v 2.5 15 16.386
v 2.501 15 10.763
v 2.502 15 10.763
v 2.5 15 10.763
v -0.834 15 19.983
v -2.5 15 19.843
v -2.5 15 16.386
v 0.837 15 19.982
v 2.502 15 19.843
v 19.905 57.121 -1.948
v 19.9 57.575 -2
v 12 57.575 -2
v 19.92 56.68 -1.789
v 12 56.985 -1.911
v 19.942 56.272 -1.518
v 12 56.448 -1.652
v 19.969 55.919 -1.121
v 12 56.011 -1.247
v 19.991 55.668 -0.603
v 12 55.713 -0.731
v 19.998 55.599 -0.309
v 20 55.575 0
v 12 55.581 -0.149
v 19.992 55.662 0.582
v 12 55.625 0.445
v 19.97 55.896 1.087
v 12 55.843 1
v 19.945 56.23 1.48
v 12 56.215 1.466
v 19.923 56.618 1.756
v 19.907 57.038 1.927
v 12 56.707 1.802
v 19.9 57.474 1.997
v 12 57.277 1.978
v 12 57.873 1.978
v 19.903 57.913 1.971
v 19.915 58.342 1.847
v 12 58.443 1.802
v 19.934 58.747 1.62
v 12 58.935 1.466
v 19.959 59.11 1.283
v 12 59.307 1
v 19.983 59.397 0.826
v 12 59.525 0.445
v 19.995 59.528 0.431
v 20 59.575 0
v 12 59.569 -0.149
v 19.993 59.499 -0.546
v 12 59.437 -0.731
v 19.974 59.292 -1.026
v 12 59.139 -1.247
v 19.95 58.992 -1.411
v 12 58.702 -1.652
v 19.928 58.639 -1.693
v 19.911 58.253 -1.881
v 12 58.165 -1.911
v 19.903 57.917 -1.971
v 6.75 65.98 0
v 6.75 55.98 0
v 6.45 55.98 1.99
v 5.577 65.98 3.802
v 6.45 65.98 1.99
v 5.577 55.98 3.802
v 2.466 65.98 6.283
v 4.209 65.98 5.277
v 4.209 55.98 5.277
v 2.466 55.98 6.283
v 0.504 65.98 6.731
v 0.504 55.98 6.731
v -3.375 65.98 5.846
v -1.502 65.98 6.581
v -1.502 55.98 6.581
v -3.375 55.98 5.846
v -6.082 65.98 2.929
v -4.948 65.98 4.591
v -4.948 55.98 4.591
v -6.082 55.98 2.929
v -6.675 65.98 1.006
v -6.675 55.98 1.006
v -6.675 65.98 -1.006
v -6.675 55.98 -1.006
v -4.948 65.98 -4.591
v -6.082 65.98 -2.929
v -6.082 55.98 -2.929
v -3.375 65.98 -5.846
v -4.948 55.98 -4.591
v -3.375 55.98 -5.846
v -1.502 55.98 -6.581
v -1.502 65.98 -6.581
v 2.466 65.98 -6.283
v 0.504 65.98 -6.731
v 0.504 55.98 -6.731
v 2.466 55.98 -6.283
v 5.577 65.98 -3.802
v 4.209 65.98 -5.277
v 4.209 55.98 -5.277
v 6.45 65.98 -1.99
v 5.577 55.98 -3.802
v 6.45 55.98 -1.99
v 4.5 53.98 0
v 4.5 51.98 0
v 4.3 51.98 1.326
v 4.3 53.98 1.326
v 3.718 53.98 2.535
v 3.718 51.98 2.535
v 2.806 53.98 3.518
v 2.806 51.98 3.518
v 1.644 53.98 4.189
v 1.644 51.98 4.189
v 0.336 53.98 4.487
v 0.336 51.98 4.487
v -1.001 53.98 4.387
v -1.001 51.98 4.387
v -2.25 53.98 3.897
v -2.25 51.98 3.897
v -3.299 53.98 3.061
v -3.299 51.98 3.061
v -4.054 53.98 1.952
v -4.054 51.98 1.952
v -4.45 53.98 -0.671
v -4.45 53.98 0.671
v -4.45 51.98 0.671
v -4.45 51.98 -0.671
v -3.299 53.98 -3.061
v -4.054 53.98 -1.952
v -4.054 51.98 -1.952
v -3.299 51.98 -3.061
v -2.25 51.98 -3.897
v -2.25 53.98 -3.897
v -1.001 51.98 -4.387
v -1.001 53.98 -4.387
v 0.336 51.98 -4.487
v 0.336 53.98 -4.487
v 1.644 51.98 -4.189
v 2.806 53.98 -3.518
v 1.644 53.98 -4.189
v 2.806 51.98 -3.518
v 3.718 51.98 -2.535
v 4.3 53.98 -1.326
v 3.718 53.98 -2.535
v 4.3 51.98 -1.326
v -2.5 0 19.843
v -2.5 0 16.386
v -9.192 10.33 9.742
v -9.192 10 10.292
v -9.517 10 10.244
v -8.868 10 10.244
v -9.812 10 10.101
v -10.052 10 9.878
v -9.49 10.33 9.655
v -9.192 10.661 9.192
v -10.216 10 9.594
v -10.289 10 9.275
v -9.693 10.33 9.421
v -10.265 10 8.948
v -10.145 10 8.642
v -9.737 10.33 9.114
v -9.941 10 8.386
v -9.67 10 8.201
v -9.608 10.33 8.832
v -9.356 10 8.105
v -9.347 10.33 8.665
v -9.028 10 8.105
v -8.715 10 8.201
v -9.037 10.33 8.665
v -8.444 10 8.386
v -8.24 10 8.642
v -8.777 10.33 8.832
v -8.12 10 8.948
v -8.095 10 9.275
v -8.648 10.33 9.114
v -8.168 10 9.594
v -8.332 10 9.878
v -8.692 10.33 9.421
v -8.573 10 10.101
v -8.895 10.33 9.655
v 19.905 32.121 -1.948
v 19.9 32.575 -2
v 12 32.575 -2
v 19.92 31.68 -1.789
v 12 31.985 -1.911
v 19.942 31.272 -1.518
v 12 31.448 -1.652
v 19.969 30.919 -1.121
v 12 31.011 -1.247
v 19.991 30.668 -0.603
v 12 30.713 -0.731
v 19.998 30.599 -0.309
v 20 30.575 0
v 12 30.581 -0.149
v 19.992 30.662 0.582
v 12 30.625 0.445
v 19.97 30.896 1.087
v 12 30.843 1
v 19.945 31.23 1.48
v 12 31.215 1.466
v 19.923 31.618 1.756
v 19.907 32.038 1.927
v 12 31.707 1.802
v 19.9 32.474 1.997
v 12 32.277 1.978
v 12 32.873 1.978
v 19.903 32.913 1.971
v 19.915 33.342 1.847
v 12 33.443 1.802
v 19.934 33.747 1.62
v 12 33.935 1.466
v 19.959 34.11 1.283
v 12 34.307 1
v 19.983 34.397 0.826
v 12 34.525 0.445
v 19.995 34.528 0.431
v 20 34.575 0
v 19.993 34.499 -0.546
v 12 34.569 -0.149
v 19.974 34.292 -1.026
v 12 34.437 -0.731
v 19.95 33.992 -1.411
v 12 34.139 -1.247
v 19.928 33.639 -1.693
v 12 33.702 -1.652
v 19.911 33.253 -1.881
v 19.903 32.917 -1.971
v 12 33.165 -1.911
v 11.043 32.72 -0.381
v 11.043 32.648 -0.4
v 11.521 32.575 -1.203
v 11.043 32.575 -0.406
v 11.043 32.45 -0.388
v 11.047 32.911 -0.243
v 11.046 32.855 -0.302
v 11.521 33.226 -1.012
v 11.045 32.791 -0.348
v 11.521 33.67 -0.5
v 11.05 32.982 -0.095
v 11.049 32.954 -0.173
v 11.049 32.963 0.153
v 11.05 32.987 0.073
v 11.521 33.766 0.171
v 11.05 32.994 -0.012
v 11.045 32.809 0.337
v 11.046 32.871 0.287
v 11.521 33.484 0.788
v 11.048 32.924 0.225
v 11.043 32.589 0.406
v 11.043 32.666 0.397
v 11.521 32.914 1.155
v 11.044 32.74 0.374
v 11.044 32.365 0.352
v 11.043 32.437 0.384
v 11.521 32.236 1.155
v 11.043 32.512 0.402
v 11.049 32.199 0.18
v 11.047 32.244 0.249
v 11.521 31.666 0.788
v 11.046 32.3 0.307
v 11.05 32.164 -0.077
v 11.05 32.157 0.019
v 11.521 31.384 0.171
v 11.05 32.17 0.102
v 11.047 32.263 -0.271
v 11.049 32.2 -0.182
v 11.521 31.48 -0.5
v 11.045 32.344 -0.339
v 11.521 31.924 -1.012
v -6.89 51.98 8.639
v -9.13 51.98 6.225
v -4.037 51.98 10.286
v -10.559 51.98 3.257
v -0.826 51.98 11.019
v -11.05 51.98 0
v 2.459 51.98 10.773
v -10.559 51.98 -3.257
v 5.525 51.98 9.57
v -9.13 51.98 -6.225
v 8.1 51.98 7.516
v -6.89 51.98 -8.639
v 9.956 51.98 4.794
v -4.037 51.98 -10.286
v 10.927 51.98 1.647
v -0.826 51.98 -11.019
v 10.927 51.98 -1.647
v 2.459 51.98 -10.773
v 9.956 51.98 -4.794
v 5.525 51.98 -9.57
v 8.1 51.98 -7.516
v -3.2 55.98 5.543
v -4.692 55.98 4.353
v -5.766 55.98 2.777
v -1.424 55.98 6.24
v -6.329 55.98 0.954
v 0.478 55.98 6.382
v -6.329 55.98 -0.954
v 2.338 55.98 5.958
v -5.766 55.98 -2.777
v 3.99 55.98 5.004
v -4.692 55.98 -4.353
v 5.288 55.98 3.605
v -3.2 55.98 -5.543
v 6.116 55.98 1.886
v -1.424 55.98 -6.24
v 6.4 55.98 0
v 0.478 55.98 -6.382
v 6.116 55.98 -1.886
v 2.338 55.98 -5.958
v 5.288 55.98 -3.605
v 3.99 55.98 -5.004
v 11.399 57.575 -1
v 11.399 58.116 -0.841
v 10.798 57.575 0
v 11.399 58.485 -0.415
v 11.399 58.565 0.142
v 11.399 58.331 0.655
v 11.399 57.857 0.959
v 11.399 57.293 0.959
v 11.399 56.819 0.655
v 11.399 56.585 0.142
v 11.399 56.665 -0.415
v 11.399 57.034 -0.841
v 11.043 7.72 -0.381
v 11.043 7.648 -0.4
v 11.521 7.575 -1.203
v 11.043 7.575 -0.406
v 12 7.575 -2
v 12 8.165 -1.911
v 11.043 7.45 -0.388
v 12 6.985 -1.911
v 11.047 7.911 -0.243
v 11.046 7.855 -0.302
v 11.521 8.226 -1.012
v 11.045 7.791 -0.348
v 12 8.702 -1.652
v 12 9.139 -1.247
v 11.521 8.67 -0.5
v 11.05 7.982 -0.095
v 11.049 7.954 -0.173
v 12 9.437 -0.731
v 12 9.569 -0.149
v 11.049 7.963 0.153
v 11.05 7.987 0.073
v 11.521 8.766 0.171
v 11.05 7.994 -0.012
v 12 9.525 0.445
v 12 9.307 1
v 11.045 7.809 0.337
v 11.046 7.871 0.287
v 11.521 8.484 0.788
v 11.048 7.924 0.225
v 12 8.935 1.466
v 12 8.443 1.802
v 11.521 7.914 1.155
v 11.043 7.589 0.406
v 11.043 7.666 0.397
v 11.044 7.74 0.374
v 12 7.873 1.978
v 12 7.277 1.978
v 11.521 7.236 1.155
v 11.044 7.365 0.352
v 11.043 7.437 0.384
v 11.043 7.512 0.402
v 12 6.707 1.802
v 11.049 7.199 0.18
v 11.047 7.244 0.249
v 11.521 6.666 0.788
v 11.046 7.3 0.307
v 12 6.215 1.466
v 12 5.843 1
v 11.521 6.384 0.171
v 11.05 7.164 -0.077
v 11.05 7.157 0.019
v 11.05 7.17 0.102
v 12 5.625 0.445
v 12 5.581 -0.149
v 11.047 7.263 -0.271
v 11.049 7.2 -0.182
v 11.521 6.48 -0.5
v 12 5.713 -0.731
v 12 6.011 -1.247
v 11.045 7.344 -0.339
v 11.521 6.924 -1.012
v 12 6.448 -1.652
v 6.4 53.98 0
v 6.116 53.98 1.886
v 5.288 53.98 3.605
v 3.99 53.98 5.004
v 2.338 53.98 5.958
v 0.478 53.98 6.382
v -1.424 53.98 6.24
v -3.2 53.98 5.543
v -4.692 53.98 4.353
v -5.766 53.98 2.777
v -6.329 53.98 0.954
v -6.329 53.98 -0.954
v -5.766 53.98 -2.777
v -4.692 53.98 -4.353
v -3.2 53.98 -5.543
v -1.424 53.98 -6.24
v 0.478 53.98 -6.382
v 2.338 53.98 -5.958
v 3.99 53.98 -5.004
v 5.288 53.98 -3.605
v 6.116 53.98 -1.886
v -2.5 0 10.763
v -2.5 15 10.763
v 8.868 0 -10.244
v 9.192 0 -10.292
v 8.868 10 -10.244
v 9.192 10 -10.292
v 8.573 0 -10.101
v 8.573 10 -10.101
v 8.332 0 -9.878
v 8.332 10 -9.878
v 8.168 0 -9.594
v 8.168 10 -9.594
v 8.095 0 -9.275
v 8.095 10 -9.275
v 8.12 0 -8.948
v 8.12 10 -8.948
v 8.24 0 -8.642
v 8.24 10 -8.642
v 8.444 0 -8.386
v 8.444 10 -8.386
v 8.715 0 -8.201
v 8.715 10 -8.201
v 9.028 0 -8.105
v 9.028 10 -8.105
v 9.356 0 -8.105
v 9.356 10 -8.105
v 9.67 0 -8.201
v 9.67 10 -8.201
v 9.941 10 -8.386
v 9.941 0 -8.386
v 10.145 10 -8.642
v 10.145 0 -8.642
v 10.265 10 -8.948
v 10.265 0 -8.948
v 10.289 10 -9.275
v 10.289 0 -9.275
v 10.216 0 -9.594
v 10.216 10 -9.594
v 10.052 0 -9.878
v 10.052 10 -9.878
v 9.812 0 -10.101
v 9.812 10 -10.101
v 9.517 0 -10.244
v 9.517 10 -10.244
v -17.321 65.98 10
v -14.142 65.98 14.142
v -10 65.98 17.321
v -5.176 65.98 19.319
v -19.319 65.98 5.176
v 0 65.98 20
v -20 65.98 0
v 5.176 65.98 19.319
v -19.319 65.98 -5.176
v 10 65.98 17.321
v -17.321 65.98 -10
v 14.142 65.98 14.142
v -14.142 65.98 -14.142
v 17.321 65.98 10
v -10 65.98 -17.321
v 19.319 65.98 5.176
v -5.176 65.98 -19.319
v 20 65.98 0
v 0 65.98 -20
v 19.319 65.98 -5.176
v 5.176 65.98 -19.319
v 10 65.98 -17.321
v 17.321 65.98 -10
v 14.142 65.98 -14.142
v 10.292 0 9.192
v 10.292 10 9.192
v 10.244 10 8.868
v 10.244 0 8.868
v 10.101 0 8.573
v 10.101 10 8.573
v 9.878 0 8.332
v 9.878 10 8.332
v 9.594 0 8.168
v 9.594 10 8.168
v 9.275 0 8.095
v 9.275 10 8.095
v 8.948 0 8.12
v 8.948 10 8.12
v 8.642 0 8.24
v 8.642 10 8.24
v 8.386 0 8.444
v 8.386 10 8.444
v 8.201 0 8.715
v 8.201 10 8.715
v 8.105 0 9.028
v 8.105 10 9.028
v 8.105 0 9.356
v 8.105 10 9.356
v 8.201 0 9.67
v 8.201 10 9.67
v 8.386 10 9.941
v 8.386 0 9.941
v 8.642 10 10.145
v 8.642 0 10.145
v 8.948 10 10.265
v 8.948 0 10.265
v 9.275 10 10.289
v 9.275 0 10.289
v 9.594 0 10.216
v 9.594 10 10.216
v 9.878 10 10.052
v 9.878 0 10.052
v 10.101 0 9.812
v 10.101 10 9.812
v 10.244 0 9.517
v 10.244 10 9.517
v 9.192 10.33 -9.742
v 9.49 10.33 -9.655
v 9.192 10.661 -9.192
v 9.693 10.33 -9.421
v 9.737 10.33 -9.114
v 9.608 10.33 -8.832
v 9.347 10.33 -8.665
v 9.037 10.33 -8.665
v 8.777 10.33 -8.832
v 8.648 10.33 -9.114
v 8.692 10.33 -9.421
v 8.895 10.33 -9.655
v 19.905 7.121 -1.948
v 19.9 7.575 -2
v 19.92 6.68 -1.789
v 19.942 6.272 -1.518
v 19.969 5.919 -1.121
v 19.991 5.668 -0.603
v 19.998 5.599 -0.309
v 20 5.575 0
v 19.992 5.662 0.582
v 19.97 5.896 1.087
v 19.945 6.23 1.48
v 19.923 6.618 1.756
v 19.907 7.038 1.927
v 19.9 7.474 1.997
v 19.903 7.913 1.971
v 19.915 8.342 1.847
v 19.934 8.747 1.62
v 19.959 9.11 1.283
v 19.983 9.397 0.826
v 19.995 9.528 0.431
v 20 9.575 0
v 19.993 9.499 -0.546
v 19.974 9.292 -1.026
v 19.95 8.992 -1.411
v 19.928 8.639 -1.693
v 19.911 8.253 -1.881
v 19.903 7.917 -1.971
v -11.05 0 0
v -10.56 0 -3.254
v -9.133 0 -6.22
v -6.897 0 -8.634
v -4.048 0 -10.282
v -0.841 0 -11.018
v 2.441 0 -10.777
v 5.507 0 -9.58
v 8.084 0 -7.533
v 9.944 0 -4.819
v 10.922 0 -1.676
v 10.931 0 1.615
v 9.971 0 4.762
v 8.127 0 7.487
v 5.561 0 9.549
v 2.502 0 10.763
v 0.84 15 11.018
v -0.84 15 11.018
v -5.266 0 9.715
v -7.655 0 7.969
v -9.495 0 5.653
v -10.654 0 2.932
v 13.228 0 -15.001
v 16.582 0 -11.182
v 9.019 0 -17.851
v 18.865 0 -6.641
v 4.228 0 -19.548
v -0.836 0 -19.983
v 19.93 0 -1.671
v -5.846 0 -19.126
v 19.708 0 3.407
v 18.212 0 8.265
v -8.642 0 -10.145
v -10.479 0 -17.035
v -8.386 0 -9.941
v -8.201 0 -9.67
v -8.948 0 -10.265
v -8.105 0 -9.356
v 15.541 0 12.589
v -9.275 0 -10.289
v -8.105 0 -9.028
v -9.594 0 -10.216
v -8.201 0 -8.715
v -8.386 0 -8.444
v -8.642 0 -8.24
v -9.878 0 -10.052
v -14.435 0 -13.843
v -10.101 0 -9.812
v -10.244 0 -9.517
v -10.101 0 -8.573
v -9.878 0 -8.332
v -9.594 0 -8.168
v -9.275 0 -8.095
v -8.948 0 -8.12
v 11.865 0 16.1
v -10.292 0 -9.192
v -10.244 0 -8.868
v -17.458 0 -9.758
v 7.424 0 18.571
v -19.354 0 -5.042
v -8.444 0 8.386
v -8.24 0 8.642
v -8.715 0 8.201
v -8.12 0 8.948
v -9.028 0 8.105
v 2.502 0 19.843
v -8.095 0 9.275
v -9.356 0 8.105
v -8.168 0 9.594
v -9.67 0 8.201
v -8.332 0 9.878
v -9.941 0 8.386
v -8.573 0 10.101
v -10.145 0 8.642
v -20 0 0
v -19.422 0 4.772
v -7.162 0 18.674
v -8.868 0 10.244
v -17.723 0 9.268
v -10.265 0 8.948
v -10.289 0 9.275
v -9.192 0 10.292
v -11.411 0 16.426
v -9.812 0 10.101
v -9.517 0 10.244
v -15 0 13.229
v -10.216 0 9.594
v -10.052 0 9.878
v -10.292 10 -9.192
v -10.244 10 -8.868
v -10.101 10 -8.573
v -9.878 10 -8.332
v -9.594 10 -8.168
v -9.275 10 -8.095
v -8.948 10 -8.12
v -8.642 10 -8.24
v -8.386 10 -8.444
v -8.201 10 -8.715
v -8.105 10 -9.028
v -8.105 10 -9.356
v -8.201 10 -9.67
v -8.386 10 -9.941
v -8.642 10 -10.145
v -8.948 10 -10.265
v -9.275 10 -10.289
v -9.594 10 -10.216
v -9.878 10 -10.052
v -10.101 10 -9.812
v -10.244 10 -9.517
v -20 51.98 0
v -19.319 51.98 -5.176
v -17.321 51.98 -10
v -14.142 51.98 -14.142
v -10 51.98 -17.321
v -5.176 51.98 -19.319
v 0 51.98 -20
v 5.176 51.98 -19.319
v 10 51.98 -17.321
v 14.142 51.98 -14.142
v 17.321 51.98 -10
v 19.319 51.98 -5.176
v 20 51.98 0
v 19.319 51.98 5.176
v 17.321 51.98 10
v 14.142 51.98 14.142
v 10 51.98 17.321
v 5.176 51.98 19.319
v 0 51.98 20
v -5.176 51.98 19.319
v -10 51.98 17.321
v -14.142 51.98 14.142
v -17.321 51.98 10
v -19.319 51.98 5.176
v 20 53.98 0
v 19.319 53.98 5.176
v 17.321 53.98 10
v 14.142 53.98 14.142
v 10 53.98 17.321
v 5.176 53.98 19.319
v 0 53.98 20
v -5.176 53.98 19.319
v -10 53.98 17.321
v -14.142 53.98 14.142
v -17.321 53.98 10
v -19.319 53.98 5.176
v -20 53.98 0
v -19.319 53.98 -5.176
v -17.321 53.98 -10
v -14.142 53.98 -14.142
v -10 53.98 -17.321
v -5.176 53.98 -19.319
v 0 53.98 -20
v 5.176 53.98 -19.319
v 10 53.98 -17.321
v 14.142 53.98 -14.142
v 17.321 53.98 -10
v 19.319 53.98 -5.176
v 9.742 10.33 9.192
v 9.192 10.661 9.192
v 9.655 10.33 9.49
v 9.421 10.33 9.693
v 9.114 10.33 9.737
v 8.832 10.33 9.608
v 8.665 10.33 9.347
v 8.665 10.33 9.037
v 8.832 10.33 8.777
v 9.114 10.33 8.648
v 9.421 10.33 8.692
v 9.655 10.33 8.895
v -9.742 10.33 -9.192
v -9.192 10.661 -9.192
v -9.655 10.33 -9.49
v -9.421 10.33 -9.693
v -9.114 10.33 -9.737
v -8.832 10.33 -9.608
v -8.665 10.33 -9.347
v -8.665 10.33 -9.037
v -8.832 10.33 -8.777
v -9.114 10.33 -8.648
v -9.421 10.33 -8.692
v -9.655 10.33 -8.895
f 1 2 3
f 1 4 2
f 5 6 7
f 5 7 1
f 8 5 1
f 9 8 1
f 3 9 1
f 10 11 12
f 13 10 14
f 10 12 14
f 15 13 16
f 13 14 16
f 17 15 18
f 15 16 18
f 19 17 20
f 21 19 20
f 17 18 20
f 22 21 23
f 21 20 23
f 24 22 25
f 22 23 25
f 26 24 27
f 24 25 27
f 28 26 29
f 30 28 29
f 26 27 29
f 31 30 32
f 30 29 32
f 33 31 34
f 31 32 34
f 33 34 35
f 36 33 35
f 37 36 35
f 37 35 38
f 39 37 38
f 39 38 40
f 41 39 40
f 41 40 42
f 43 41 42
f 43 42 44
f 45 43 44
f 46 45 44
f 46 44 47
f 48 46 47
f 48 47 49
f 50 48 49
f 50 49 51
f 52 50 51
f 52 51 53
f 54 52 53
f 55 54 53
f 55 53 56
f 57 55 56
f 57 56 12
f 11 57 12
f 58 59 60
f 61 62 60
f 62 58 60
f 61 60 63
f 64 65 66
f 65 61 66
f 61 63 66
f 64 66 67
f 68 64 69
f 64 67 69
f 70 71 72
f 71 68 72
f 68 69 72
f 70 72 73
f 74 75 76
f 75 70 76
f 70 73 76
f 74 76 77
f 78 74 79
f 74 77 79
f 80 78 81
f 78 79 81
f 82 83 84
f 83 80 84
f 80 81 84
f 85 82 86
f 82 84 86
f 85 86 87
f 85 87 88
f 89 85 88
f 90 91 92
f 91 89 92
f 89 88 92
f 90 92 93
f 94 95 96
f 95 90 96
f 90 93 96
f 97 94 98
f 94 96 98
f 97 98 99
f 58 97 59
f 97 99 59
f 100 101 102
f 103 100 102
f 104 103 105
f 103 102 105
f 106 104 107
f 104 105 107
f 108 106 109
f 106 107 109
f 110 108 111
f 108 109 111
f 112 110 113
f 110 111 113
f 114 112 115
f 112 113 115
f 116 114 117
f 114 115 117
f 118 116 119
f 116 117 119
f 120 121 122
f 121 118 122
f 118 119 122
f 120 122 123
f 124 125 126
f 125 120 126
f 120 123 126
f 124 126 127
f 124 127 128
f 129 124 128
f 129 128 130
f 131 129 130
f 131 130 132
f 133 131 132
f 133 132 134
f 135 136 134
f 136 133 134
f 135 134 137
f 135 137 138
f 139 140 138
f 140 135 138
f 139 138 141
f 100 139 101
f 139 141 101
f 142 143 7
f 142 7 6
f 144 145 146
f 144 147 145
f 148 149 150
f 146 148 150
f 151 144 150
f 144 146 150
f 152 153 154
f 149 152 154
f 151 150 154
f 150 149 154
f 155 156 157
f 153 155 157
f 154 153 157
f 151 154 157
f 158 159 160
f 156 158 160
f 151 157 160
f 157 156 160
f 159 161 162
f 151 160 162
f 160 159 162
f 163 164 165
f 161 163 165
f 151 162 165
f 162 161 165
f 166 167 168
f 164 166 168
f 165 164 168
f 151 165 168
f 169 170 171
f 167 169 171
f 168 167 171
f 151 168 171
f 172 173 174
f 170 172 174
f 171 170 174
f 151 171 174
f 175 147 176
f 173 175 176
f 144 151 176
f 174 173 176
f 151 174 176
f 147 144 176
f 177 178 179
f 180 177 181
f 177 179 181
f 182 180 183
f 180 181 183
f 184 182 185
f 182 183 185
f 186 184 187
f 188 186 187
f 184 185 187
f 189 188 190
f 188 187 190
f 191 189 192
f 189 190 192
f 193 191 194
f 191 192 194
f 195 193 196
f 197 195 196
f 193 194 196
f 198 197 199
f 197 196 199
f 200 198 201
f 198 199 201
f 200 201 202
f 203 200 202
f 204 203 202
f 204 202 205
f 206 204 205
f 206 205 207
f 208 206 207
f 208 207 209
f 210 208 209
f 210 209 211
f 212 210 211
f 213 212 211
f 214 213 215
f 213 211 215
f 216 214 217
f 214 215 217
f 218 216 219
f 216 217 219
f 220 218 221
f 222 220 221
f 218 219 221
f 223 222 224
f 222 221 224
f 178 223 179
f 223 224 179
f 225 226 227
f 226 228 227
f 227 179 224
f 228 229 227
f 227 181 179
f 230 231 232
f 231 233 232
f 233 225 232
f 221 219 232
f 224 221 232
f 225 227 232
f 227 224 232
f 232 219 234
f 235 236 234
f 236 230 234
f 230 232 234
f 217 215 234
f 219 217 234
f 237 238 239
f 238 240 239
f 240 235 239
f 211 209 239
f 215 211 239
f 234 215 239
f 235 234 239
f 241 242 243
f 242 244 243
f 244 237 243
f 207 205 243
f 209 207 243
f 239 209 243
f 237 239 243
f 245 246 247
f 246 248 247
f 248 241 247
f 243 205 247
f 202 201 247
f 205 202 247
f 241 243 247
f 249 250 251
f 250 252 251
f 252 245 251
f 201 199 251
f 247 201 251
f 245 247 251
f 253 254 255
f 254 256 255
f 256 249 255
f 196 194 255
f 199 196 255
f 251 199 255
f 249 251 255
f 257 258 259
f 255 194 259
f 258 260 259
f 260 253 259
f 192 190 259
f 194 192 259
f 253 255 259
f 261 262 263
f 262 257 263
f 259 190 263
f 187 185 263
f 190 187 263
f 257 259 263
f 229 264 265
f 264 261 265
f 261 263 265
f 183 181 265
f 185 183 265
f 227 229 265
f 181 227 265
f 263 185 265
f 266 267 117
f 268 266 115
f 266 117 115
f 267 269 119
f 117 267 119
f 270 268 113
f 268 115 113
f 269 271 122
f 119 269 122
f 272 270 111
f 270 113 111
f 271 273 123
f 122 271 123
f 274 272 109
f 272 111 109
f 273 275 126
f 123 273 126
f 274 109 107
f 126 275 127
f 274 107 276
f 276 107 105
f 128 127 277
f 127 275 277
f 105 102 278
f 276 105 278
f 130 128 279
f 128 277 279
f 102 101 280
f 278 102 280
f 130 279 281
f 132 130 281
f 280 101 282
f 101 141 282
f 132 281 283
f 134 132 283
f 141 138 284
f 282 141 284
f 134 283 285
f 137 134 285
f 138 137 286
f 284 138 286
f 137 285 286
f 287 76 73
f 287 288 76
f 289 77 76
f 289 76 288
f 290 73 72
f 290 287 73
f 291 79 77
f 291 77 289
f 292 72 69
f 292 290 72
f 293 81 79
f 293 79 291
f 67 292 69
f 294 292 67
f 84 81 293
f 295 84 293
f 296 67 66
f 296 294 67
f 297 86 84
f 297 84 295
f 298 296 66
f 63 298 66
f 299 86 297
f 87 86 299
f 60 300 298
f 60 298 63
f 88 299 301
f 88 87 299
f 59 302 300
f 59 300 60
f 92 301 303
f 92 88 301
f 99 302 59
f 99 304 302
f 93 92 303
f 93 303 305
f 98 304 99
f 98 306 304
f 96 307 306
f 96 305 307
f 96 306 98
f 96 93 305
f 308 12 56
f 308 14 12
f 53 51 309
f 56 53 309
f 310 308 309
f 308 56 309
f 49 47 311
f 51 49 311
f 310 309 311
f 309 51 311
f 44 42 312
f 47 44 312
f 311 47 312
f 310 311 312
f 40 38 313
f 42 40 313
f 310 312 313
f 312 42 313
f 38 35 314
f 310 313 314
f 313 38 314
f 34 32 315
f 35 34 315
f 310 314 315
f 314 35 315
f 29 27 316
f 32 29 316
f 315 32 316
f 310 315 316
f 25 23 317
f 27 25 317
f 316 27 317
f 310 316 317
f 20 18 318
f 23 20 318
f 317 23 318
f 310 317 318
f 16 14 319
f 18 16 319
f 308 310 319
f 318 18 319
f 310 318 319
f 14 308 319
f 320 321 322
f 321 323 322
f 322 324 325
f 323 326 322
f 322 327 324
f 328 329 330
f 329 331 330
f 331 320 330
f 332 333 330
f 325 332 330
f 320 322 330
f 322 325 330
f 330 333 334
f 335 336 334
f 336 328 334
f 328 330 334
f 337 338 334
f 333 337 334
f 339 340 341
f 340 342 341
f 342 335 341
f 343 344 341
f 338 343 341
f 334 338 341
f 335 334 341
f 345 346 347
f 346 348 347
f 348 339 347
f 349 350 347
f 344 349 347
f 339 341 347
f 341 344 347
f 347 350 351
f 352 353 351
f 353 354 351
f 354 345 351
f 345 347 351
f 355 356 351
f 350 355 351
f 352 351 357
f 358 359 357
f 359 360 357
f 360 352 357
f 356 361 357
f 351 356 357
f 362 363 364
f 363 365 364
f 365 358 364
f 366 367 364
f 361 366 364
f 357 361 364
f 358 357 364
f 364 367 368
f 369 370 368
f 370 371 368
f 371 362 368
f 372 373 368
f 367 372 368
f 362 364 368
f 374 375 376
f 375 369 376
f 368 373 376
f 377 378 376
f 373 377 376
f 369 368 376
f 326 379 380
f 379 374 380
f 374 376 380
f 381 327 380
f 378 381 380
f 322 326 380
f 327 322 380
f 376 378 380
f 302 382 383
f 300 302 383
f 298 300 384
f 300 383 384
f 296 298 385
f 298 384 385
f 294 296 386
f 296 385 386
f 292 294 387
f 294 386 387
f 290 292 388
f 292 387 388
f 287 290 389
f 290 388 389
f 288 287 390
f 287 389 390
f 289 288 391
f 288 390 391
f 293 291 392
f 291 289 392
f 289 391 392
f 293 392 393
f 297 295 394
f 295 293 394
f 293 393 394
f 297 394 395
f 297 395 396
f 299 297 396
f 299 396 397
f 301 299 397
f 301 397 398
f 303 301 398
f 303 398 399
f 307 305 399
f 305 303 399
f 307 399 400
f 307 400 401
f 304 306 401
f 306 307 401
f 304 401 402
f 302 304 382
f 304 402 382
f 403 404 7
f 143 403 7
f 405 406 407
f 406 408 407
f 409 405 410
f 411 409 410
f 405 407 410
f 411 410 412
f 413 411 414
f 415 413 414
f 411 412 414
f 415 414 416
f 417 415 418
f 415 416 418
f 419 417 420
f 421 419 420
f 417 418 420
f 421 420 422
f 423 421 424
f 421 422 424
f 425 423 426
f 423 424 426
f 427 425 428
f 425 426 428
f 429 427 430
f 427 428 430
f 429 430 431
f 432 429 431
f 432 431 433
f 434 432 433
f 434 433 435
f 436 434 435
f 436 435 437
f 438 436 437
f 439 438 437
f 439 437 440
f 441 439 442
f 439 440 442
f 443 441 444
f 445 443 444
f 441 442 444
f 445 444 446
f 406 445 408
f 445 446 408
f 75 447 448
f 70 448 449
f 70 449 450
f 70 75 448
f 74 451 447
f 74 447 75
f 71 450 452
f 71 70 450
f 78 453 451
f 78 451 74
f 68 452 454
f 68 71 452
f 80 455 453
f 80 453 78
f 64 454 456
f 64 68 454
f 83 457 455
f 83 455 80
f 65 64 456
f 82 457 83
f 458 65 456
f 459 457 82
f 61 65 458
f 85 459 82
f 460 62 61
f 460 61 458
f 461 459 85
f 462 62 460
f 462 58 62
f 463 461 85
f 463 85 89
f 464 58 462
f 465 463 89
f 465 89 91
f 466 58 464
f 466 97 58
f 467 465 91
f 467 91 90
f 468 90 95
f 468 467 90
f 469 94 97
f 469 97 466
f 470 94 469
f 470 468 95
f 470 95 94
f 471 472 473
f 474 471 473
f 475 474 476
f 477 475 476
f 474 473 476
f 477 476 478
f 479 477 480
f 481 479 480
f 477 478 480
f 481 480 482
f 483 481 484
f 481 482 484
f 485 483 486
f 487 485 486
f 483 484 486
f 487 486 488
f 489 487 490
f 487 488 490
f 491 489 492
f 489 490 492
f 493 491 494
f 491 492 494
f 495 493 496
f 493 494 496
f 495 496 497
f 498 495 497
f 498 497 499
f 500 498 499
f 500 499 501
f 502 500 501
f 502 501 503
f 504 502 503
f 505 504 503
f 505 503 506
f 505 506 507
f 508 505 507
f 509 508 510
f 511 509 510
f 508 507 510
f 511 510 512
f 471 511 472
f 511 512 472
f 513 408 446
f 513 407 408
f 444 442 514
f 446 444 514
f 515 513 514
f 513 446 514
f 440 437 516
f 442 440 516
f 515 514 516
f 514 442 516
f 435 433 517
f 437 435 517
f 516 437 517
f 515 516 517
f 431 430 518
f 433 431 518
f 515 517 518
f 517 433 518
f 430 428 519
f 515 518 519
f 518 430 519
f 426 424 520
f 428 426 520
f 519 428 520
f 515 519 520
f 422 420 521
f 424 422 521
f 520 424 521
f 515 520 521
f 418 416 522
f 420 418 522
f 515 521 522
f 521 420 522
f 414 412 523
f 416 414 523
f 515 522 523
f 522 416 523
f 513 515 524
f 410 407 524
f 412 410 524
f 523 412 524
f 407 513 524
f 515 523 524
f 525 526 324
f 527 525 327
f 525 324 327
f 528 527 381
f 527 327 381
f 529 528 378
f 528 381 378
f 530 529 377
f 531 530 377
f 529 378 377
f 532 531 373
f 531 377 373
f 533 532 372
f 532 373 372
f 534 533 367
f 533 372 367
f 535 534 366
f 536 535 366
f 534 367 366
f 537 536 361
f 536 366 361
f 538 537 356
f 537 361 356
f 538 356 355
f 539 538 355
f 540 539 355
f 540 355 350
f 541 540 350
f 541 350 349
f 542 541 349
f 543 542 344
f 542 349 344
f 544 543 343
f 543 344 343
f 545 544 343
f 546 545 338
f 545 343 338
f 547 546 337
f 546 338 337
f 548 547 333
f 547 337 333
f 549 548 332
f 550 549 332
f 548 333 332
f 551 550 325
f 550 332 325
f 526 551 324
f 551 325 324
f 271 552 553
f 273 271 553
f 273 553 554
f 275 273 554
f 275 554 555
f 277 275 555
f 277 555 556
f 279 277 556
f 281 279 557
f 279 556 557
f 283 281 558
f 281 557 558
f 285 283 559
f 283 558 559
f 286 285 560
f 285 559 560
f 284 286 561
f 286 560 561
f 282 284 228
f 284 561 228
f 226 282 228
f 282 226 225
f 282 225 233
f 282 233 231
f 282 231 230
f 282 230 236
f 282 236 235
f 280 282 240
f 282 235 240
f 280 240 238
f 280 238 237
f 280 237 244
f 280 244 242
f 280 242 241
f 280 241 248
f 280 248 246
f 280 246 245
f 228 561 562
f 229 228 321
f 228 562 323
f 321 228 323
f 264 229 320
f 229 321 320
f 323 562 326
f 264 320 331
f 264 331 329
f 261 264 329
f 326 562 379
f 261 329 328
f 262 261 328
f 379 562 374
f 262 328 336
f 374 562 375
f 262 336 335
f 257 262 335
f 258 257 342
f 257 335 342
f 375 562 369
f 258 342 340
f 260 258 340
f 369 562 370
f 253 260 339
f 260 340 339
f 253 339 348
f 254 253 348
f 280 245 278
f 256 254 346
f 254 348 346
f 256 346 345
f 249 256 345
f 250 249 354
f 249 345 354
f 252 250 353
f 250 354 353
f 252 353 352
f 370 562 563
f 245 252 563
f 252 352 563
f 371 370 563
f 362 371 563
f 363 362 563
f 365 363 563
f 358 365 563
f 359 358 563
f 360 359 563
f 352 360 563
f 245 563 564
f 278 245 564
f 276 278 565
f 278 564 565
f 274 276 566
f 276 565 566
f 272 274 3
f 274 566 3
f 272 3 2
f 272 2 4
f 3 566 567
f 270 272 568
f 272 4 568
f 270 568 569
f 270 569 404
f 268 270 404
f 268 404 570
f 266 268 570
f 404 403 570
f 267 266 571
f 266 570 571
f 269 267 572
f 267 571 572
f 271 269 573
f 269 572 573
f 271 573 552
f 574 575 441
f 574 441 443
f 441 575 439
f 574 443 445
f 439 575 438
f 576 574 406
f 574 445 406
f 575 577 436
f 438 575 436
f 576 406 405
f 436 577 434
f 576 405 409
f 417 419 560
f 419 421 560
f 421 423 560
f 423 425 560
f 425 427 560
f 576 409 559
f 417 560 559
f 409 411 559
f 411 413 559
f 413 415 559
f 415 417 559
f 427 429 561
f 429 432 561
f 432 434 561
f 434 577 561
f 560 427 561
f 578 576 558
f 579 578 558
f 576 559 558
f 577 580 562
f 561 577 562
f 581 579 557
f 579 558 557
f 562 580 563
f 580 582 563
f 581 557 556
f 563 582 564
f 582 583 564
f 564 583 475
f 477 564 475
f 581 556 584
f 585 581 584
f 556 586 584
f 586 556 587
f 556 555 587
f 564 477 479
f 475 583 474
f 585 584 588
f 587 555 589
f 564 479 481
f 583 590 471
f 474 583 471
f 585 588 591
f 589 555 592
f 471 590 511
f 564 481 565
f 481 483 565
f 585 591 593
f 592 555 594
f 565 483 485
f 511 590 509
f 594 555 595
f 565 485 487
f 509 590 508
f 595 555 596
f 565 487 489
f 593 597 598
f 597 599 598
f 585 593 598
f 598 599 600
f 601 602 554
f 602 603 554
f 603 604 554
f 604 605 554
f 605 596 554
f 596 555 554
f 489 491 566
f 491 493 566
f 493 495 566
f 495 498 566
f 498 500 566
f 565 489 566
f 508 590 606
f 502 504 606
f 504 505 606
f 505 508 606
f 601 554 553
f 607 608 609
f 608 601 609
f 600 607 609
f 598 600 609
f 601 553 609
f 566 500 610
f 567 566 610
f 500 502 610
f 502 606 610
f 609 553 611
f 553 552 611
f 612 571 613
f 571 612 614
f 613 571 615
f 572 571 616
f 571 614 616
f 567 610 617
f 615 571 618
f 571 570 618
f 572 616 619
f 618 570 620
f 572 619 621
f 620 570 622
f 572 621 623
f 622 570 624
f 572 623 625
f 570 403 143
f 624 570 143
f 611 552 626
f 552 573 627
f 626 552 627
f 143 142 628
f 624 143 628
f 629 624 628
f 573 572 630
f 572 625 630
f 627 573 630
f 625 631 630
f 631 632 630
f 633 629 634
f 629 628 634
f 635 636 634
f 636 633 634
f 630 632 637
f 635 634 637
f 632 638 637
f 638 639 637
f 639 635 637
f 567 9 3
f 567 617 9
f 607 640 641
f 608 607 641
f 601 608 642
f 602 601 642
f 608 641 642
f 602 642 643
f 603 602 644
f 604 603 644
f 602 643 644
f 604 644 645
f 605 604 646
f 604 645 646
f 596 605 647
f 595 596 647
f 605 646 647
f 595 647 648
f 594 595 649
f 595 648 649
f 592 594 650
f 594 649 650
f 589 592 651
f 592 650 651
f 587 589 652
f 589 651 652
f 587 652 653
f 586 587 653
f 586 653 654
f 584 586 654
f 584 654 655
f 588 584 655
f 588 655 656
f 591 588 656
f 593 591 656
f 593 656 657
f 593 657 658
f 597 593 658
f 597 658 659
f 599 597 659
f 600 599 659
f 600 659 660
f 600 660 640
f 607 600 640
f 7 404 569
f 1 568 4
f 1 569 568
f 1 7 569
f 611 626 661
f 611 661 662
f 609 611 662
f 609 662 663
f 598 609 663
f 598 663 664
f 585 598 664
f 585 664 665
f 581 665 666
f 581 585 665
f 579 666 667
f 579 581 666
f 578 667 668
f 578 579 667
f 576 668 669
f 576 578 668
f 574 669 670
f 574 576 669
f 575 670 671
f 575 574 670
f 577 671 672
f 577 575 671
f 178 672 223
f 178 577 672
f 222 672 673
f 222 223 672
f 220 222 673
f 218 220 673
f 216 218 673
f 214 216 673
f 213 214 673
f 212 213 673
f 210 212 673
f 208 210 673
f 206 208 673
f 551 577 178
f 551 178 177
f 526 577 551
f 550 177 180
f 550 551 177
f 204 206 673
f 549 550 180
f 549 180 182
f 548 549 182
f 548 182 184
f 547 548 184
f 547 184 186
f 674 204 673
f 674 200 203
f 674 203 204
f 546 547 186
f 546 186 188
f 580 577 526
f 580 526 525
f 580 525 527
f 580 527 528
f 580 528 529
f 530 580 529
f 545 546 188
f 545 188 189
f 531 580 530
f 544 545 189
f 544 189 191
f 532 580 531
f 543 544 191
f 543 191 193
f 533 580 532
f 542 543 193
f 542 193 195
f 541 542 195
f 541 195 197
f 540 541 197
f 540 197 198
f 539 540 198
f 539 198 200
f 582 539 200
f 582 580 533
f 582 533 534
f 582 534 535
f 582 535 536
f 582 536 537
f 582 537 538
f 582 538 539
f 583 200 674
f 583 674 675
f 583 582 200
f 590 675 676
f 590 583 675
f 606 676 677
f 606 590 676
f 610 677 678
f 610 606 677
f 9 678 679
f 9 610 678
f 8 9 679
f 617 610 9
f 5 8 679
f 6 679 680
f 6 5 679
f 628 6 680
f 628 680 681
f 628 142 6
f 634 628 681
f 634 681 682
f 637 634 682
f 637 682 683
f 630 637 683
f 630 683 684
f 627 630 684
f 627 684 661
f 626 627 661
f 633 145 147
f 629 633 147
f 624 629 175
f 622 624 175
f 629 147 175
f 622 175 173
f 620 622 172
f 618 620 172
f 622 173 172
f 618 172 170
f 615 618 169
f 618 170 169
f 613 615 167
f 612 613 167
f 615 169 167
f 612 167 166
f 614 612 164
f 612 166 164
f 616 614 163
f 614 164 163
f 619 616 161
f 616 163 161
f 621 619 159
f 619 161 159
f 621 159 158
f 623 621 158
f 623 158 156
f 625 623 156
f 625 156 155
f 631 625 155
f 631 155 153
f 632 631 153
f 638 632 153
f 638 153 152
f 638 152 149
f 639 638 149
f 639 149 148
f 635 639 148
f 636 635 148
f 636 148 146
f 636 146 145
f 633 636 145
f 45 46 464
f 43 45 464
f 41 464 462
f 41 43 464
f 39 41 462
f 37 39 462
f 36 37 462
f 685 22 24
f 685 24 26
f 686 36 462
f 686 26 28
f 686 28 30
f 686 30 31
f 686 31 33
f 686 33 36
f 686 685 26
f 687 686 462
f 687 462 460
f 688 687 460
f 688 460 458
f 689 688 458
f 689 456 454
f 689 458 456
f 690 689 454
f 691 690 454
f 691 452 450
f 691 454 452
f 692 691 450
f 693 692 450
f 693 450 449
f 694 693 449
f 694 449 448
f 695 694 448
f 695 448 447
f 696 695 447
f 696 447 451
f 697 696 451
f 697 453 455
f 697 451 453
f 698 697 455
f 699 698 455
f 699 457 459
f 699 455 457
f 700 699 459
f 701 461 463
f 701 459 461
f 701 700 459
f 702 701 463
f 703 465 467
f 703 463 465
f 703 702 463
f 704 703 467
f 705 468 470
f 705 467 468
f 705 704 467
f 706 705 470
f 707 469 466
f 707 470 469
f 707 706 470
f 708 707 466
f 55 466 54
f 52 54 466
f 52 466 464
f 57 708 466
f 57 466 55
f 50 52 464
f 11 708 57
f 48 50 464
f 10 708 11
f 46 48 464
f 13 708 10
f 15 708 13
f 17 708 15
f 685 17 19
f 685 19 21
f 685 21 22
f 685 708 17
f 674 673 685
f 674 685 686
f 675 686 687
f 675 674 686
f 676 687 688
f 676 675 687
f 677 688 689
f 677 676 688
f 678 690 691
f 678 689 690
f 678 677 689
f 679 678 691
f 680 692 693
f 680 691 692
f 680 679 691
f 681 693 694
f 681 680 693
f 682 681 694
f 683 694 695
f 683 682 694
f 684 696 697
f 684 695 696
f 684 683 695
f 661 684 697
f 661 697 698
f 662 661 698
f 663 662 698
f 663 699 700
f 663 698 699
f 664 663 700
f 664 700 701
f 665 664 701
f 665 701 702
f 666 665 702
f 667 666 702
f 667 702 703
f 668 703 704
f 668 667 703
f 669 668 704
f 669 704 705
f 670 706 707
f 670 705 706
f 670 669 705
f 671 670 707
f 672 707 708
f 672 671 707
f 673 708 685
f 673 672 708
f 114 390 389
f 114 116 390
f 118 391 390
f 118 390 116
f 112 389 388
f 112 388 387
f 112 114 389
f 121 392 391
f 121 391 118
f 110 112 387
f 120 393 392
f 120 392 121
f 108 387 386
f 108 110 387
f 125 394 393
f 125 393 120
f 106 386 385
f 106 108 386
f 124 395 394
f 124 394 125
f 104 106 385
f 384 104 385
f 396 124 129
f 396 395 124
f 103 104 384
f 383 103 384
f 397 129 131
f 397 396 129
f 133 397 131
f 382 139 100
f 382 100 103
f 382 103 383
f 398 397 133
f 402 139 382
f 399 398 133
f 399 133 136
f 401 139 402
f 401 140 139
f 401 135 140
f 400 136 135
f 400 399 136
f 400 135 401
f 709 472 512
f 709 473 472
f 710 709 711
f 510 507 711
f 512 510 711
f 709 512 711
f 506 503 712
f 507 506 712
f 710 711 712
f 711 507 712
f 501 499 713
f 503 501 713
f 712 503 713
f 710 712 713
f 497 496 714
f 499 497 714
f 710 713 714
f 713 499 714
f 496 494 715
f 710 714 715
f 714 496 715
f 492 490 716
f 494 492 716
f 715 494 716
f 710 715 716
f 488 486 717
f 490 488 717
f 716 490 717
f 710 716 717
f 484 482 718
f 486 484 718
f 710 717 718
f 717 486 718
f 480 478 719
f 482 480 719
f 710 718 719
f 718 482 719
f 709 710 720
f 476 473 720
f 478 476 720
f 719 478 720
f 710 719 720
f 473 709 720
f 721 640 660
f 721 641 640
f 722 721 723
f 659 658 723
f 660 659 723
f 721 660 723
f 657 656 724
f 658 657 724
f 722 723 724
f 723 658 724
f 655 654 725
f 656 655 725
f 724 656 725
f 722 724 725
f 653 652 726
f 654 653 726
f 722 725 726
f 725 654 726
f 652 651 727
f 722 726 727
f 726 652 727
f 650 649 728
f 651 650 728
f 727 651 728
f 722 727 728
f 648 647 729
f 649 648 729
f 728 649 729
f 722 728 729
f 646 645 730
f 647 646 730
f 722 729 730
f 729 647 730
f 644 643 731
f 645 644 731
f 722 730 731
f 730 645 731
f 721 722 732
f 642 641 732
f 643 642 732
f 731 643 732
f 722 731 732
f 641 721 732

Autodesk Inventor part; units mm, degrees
ref_plane "XZ Plane" through (0, 0, 0) normal (0, 1, 0) x (-1, 0, 0)
ref_plane "XY Plane" through (0, 0, 0) normal (0, 0, 1) x (1, 0, 0)
sketch "Sketch1" plane through (0, 0, 0) normal (0, 1, 0) x (-1, 0, 0)
  circle A0 centre (0, 0) radius 20
  circle A1 centre (0, 0) radius 11.05
  dimension "d0" = 40
  dimension "d1" = 22.1
extrude "Extrusion1" add sketch "Sketch1" along normal blind 51.98
sketch "Sketch2" plane through (0, 0, 0) normal (0, -1, 0) x (1, 0, 0)
  circle A0 centre (0, 0) radius 13
  line L0 (0, 0) -> (9.1924, 0)
  line L1 (9.1924, 0) -> (9.1924, -9.1924)
  line L2 (9.1924, -9.1924) -> (0, -9.1924)
  line L3 (0, -9.1924) -> (0, 0)
  dimension "d4" = 26
  dimension "d5" = 9.1924
hole "Hole1" at (9.1924, 0, -9.1924) direction (0, 1, 0) diameter 2.2 depth 10 tip angle 118
pattern_circular "Circular Pattern1" count 4 over 360 about axis through (0, 0, 0) along (0, 1, 0) of "Hole1"
thread "Thread1" size "M2.2x0.25" class "6H" standard "ISO Metric profile" full length
thread "Thread3" size "M2.2x0.25" class "6H" standard "ISO Metric profile" full length
thread "Thread4" size "M2.2x0.25" class "6H" standard "ISO Metric profile" full length
thread "Thread5" size "M2.2x0.25" class "6H" standard "ISO Metric profile" full length
sketch "Sketch3" plane through (0, 51.98, 0) normal (0, 1, 0) x (1, 0, 0)
  circle A0 centre (0, 0) radius 20
  circle A1 centre (0, 0) radius 4.5
  dimension "d26" = 40
  dimension "d27" = 9
extrude "Extrusion2" add sketch "Sketch3" along normal blind 2
sketch "Sketch4" plane through (0, 53.98, 0) normal (0, 1, 0) x (1, 0, 0)
  point P0 (0, 0)
sketch "Sketch5" plane through (0, 53.98, 0) normal (0, 1, 0) x (1, 0, 0)
  circle A0 centre (0, 0) radius 6.75
  circle A1 centre (0, 0) radius 20
  dimension "d30" = 13.5
  dimension "d31" = 40
extrude "Extrusion3" add sketch "Sketch5" along normal blind 12
thread "Thread6" size "M14x0.5" class "6H" standard "ISO Metric profile" full length
sketch "Sketch8" plane through (0, 0, 0) normal (0, -1, 0) x (1, 0, 0)
  point P0 (0, 0)
sketch "Sketch9" plane through (0, 0, 0) normal (0, -1, 0) x (1, 0, 0)
  line L0 (0, 9.7277) -> (2.5, 9.7277)
  line L1 (2.5, 9.7277) -> (2.5, 16.3855)
  line L2 (2.5, 16.3855) -> (0, 16.3855)
  line L3 (0, 16.3855) -> (0, 9.7277)
  line L4 (0, 9.7277) -> (-2.5, 9.7277)
  line L5 (-2.5, 9.7277) -> (-2.5, 16.3855)
  line L6 (-2.5, 16.3855) -> (0, 16.3855)
  line L7 (0, 16.3855) -> (0, 9.7277)
  point P0 (0, 0)
  dimension "d54" = 2.5
  dimension "d55" = 2.5
extrude "Extrusion4" cut sketch "Sketch9" against normal blind 15
sketch "Sketch10" plane through (0, 0, 0) normal (1, 0, 0) x (0, 1, 0)
  point P0 (0, 0)
ref_plane "Work Plane1" through (20, 0, 0) normal (1, 0, 0) x (0, 1, 0)
sketch "Sketch15" plane through (0, 0, 0) normal (0, -1, 0) x (1, 0, 0)
  line L0 (2.5024, 10.6669) -> (-2.5, 10.6669)
  line L1 (-2.5, 10.6669) -> (-2.5, 24.5822)
  line L2 (-2.5, 24.5822) -> (2.5024, 24.5822)
  line L3 (2.5024, 24.5822) -> (2.5024, 10.6669)
  point P0 (0, 0)
extrude "Extrusion5" cut sketch "Sketch15" against normal blind 15
sketch "Sketch18" plane through (20, 0, 0) normal (1, 0, 0) x (0, 1, 0)
  line L0 (0, 0) -> (7.575, 0)
  line L1 (7.575, 0) -> (32.575, 0)
  line L2 (32.575, 0) -> (57.575, 0)
  dimension "d129" = 12.8
  dimension "d102" = 7.575
  dimension "d103" = 25
  dimension "d104" = 25
  dimension "d105" = 180
hole "Hole6" at (20, 57.575, 0) direction (-1, 0, 0) diameter 4 depth 8 tip angle 118
hole "Hole7" at (20, 7.575, 0) at (20, 32.575, 0) direction (-1, 0, 0) diameter 4 depth 8 tip angle 118
thread "Thread7" size "M4x0.7" class "6H" standard "ANSI Metric M Profile" full length
thread "Thread8" size "M4x0.7" class "6H" standard "ANSI Metric M Profile" full length
thread "Thread9" size "M4x0.7" class "6H" standard "ANSI Metric M Profile" full length
sketch "Sketch19" plane through (0, 53.98, 0) normal (0, 1, 0) x (1, 0, 0)
  circle A0 centre (0, 0) radius 6.75
  circle A1 centre (0, 0) radius 6.4
  dimension "d128" = 13.5
  dimension "d129" = 12.8
extrude "Extrusion6" add sketch "Sketch19" along normal blind 2
thread "Thread11" size "M14x0.5" class "6H" standard "ANSI Metric M Profile" length 10
equation "\"d43\" = 60deg"
equation "\"Sketch6_Pitch\" = 0.5"
properties part number "enclosire17ghz"
